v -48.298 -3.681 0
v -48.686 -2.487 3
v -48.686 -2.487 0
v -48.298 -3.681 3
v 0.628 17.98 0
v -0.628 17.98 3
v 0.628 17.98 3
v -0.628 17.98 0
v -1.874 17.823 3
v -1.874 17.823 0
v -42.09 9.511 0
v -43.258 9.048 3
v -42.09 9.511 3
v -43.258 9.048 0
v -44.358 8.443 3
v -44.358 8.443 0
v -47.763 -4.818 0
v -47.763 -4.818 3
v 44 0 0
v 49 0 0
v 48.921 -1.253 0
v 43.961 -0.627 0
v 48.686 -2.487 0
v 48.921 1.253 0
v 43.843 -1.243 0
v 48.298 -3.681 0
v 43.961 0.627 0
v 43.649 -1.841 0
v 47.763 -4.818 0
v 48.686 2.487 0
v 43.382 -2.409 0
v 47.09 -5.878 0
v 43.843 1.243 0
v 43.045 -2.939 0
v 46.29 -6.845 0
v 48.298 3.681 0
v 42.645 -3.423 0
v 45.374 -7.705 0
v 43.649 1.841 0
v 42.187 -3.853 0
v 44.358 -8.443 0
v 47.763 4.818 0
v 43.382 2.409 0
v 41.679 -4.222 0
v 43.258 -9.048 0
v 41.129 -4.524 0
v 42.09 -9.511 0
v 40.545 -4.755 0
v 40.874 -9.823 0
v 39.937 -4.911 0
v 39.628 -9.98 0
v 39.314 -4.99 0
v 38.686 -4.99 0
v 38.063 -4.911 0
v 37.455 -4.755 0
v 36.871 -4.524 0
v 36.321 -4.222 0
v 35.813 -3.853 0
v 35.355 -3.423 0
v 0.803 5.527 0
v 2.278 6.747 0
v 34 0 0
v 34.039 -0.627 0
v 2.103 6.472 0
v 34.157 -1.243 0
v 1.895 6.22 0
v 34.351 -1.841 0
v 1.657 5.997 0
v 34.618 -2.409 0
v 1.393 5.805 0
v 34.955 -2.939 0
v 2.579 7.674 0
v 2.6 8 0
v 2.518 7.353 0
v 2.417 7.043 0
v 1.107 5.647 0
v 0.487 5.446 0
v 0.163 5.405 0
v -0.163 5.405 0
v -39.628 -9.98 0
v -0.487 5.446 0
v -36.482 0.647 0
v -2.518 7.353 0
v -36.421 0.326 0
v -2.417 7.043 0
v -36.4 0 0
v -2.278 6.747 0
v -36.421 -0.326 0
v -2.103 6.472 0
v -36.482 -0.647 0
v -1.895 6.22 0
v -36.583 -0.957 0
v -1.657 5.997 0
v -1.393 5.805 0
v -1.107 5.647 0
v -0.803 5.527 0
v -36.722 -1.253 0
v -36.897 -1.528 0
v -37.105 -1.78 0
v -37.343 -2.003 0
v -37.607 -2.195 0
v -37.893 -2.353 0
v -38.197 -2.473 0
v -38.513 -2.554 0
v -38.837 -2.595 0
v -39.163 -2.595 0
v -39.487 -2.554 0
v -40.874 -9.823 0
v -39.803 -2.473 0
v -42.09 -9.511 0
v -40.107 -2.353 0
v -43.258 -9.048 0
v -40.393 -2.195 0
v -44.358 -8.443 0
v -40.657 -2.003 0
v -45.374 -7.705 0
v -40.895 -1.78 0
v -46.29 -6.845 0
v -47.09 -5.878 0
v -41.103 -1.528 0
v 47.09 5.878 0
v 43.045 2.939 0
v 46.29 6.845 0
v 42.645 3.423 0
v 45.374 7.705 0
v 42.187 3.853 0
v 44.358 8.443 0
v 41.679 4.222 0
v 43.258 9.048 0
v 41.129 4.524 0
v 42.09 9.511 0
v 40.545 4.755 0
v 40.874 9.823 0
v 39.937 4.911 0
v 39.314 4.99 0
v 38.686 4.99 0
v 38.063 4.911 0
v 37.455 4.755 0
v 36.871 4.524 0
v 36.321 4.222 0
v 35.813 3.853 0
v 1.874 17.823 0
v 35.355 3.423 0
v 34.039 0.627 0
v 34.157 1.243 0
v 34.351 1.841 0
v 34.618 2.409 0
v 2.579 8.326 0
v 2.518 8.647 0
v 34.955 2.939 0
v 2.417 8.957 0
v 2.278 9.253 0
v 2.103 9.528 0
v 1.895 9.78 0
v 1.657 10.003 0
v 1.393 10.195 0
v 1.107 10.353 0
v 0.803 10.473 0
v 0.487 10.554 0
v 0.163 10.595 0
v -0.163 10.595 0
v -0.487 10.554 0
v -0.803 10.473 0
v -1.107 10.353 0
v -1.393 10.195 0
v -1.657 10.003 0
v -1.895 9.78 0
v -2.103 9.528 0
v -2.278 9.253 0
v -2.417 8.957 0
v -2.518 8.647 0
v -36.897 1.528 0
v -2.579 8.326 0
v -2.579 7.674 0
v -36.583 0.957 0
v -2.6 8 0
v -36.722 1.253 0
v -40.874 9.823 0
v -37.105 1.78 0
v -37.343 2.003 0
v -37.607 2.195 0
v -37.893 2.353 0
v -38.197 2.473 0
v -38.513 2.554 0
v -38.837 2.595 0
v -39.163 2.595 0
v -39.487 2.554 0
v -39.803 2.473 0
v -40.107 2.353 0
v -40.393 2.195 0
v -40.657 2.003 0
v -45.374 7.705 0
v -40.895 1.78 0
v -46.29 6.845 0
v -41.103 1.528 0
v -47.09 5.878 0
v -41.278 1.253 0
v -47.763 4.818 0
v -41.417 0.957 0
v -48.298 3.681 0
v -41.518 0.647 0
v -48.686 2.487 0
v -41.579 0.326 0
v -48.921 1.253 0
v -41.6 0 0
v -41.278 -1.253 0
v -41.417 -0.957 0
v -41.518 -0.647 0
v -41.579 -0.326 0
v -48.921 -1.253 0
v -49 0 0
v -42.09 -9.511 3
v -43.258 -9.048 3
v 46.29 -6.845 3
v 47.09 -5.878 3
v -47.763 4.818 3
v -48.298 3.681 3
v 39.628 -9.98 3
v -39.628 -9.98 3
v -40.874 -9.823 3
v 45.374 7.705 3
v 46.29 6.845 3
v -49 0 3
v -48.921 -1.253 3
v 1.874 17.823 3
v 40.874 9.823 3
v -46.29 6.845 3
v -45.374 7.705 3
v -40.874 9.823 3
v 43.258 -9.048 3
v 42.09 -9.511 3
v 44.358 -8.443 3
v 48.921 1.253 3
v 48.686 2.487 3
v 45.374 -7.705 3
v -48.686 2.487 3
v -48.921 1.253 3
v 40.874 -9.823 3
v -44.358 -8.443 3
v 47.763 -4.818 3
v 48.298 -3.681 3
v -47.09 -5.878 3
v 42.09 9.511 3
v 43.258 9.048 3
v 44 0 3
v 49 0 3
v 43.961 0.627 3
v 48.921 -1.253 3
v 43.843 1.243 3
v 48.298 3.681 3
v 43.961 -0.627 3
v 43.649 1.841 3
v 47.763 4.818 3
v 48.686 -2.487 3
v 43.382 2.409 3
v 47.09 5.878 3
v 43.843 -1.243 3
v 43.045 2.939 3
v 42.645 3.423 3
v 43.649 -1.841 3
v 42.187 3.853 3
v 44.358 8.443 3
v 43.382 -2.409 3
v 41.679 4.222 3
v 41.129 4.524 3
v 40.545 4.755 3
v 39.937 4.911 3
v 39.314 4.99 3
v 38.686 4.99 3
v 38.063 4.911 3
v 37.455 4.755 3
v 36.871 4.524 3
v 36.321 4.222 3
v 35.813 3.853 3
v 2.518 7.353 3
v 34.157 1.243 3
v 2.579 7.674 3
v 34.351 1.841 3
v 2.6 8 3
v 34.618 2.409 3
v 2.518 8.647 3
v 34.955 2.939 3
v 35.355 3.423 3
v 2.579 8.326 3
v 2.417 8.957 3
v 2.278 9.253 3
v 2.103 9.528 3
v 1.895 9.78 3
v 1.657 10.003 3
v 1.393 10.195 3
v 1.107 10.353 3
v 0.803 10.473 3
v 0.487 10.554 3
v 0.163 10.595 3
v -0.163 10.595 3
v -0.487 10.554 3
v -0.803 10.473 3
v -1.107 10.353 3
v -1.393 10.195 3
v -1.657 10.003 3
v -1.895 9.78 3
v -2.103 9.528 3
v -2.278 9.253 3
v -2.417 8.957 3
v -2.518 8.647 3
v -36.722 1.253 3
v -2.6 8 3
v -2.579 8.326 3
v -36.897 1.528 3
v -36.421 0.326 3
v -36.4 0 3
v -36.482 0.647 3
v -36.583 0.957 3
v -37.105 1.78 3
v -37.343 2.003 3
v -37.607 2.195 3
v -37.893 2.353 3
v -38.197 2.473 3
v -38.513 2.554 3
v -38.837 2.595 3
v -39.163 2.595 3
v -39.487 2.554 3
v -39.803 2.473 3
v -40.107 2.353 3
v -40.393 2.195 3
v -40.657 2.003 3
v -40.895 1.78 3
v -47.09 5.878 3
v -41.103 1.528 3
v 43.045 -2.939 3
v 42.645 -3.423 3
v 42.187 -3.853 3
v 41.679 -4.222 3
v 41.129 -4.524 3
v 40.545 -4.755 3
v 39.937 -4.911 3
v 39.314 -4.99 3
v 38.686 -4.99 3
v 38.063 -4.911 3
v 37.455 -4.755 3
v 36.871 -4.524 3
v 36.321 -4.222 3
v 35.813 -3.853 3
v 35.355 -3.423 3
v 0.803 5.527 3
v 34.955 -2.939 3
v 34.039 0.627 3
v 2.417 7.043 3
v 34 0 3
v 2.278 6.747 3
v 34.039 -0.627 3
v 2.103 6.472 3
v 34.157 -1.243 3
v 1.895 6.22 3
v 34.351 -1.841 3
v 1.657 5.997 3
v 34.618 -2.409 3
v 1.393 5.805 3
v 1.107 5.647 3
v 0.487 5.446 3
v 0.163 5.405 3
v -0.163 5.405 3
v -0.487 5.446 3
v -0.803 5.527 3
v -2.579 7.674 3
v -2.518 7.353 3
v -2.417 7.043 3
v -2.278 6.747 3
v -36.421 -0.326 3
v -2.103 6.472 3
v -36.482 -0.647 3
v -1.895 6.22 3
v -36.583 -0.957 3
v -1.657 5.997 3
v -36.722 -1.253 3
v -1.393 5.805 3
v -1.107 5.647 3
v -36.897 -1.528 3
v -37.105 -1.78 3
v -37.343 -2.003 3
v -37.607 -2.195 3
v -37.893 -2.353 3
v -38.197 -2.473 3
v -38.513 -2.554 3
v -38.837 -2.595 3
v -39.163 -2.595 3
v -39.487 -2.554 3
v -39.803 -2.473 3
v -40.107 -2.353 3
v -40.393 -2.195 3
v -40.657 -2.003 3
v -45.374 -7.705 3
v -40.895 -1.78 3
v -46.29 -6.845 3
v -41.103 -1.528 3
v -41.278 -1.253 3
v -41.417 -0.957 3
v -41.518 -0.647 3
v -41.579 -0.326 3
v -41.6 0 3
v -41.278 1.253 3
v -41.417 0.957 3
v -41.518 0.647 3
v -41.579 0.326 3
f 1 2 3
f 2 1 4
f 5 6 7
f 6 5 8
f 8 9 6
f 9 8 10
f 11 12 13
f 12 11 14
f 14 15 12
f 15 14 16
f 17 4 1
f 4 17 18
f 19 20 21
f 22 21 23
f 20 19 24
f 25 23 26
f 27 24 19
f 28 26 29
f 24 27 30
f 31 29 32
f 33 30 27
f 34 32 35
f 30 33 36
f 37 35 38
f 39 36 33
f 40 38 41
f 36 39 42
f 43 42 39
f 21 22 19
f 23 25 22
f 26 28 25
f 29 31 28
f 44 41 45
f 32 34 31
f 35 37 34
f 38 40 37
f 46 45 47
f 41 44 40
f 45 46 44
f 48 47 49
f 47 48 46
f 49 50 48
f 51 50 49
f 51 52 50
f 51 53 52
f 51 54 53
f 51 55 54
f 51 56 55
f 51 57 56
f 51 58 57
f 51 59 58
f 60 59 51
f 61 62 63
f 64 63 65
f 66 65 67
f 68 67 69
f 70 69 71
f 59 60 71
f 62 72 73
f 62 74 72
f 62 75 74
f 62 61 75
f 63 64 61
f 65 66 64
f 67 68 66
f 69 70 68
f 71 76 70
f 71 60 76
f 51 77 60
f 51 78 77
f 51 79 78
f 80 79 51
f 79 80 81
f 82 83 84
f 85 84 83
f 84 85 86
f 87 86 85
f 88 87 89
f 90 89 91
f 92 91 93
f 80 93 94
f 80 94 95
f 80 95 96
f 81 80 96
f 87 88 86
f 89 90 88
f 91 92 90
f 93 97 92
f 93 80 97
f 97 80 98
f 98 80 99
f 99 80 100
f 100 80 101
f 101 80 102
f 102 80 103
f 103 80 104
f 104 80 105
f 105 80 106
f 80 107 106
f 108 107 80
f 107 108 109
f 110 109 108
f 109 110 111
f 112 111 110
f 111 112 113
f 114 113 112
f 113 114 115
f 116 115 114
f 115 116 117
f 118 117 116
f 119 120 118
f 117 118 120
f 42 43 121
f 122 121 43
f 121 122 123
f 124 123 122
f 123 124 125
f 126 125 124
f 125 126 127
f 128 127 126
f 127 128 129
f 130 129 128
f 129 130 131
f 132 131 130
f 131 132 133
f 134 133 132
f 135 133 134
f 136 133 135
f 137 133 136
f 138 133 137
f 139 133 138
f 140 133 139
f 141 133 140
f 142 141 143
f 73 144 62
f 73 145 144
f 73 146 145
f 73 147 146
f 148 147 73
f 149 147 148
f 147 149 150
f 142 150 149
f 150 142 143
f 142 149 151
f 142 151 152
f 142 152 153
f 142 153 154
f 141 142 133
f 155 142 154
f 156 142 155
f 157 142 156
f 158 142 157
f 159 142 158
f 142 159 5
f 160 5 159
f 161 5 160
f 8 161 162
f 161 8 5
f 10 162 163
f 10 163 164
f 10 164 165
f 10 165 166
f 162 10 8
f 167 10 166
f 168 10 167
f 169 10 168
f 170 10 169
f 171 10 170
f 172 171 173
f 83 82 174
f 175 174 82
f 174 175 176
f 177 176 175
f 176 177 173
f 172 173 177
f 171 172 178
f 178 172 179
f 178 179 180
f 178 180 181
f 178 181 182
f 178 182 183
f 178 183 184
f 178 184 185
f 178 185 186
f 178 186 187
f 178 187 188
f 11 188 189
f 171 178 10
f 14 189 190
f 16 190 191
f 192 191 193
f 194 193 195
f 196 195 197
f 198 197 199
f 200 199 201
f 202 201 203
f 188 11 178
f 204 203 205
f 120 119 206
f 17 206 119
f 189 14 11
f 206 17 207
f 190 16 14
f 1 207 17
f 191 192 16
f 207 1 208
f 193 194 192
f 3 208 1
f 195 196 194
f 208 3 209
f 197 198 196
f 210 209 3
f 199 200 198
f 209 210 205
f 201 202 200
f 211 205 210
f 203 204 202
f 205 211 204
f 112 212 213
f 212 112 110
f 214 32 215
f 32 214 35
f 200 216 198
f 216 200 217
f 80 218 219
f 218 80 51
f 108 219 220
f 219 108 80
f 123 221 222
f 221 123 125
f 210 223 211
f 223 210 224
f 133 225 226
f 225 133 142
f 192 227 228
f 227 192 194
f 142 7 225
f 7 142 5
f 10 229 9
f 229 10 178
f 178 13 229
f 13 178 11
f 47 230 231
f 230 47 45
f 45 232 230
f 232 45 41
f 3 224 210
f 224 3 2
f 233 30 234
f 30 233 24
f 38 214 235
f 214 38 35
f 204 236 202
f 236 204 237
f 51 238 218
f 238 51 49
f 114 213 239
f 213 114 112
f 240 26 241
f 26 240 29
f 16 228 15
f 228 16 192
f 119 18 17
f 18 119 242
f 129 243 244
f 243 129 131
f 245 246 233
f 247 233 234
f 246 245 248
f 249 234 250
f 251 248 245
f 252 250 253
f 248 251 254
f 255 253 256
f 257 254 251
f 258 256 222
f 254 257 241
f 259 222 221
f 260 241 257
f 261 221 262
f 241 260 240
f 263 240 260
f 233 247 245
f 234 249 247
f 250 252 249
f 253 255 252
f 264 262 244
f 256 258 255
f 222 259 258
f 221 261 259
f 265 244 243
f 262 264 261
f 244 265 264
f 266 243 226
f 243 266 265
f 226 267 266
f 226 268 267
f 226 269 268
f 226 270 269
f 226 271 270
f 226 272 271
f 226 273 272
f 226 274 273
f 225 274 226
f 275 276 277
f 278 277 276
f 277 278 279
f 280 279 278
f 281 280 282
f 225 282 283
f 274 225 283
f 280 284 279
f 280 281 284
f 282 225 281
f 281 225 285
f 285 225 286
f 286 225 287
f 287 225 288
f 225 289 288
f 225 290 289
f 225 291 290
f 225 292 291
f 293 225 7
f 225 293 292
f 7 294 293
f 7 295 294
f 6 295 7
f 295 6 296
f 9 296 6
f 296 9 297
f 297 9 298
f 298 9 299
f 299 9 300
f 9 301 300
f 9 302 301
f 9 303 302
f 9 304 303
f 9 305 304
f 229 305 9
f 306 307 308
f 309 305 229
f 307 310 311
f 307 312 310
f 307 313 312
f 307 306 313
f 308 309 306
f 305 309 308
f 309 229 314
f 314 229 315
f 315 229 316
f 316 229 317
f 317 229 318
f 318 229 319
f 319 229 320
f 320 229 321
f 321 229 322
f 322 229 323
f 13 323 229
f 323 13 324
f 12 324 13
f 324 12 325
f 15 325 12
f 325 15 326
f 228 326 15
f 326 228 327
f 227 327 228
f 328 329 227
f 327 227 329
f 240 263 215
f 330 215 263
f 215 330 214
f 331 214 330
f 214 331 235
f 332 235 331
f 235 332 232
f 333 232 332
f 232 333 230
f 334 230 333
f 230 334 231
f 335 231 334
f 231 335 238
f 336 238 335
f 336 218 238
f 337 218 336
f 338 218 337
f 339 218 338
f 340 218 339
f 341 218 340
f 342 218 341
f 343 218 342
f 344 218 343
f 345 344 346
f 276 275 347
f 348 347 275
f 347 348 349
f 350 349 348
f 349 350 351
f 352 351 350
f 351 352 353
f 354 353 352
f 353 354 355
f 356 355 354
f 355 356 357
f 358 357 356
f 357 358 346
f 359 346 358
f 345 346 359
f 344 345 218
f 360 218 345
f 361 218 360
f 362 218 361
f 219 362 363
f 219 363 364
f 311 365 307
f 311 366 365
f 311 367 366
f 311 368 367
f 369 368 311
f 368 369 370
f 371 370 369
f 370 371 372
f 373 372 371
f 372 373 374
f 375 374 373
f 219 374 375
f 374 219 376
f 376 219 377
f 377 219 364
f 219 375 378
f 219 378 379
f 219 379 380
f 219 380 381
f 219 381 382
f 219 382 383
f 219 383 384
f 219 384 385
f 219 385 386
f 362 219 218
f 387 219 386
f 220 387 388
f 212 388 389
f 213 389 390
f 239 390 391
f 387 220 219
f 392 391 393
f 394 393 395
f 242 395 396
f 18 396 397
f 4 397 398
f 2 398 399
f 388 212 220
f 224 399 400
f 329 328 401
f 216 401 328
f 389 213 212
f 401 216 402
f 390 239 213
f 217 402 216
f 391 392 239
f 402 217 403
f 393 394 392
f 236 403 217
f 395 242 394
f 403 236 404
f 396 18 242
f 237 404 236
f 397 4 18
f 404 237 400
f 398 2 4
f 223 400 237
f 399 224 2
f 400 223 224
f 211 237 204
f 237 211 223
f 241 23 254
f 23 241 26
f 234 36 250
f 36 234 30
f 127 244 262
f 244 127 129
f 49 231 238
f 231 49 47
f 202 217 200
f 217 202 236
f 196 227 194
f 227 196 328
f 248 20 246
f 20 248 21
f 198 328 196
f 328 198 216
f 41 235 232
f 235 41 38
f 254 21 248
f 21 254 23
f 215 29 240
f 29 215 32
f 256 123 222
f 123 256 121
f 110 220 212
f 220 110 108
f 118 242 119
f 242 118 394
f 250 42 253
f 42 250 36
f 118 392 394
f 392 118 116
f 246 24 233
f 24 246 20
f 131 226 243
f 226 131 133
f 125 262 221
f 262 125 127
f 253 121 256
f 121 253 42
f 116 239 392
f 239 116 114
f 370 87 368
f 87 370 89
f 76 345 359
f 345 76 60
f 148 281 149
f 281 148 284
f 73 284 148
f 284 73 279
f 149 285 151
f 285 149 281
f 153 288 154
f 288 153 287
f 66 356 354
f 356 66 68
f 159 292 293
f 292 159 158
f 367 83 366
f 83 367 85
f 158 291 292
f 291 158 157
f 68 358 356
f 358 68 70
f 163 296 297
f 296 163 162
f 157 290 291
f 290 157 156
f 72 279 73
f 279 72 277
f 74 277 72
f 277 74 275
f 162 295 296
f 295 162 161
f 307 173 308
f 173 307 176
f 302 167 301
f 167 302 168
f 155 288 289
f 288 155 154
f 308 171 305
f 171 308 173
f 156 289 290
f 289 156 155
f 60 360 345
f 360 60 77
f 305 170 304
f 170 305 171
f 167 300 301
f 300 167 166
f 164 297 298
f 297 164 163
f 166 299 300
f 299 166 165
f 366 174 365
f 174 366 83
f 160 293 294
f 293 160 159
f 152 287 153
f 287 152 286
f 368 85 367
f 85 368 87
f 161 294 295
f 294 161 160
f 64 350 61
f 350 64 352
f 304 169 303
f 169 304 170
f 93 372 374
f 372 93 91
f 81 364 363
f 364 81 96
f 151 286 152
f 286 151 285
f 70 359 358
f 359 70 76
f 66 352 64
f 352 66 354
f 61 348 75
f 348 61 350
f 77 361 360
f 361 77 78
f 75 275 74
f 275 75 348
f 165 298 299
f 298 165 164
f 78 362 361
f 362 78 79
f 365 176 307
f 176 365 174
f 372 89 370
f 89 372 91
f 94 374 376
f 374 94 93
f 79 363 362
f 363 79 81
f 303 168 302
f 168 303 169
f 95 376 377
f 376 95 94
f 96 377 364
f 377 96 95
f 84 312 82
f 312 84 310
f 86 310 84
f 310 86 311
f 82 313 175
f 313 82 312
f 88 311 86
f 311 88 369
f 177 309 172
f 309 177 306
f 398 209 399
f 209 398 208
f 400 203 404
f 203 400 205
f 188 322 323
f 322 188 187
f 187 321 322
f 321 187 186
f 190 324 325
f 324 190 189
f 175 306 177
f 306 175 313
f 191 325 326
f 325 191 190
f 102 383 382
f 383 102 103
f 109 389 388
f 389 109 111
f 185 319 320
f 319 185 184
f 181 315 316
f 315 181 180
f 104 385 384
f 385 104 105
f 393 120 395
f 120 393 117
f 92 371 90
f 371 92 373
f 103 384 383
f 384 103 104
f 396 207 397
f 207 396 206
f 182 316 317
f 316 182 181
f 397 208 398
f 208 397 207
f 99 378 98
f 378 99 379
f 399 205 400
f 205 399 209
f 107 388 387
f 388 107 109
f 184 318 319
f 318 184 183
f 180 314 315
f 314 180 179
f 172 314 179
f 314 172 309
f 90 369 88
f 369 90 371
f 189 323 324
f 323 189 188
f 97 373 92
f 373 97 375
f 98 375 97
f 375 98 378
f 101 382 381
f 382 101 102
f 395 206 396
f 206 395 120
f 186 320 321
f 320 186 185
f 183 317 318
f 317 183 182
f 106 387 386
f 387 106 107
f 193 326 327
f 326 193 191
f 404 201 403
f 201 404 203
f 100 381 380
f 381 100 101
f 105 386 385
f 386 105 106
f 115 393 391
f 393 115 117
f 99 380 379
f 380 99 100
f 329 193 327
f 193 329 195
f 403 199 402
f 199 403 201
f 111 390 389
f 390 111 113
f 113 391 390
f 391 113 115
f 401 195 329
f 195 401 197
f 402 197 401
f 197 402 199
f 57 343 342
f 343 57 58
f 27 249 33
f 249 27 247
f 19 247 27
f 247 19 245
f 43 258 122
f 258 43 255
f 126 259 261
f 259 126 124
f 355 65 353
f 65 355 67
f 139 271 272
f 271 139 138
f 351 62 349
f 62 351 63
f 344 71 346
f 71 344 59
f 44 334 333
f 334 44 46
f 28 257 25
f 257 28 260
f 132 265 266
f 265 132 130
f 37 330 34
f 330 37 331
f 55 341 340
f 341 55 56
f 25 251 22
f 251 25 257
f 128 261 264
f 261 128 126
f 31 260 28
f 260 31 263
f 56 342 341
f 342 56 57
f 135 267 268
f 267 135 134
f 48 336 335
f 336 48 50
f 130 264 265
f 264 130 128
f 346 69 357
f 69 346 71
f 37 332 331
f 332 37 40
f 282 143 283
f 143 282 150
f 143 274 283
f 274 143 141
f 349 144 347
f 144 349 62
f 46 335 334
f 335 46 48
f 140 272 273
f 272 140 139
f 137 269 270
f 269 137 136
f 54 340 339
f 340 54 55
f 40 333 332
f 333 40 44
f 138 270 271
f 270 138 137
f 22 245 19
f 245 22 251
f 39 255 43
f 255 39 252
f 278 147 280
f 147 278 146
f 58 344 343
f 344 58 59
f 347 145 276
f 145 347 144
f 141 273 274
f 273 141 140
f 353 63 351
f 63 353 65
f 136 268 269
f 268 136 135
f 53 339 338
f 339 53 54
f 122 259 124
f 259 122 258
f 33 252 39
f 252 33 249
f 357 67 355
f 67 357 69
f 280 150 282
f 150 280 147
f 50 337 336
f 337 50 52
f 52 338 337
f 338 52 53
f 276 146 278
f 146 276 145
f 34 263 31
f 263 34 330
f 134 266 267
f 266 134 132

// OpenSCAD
HOLE_DIST = 78;
HOLE_DIA = 5.2;

BEARING_DIA = 10;
CENTER_OFFSET = 8;

FRAME_DIA = 20;
FRAME_THICKNESS = 3;


$fn = 50;

module frame() {
  difference() {
    hull() {
      for(i = [-1, 1]) {
        translate([i * HOLE_DIST/2, 0, 0])
        cylinder(d = FRAME_DIA, h = FRAME_THICKNESS);
      }

      translate([0, CENTER_OFFSET, 0])
      cylinder(d = FRAME_DIA, h = FRAME_THICKNESS);
    }

    translate([0, CENTER_OFFSET, 0])
    cylinder(d = HOLE_DIA, h = FRAME_THICKNESS);
    
    translate([-HOLE_DIST/2, 0, 0])
    cylinder(d = HOLE_DIA, h = FRAME_THICKNESS);

    translate([HOLE_DIST/2, 0, 0])
    cylinder(d = BEARING_DIA, h = FRAME_THICKNESS);
  }
}

frame();
